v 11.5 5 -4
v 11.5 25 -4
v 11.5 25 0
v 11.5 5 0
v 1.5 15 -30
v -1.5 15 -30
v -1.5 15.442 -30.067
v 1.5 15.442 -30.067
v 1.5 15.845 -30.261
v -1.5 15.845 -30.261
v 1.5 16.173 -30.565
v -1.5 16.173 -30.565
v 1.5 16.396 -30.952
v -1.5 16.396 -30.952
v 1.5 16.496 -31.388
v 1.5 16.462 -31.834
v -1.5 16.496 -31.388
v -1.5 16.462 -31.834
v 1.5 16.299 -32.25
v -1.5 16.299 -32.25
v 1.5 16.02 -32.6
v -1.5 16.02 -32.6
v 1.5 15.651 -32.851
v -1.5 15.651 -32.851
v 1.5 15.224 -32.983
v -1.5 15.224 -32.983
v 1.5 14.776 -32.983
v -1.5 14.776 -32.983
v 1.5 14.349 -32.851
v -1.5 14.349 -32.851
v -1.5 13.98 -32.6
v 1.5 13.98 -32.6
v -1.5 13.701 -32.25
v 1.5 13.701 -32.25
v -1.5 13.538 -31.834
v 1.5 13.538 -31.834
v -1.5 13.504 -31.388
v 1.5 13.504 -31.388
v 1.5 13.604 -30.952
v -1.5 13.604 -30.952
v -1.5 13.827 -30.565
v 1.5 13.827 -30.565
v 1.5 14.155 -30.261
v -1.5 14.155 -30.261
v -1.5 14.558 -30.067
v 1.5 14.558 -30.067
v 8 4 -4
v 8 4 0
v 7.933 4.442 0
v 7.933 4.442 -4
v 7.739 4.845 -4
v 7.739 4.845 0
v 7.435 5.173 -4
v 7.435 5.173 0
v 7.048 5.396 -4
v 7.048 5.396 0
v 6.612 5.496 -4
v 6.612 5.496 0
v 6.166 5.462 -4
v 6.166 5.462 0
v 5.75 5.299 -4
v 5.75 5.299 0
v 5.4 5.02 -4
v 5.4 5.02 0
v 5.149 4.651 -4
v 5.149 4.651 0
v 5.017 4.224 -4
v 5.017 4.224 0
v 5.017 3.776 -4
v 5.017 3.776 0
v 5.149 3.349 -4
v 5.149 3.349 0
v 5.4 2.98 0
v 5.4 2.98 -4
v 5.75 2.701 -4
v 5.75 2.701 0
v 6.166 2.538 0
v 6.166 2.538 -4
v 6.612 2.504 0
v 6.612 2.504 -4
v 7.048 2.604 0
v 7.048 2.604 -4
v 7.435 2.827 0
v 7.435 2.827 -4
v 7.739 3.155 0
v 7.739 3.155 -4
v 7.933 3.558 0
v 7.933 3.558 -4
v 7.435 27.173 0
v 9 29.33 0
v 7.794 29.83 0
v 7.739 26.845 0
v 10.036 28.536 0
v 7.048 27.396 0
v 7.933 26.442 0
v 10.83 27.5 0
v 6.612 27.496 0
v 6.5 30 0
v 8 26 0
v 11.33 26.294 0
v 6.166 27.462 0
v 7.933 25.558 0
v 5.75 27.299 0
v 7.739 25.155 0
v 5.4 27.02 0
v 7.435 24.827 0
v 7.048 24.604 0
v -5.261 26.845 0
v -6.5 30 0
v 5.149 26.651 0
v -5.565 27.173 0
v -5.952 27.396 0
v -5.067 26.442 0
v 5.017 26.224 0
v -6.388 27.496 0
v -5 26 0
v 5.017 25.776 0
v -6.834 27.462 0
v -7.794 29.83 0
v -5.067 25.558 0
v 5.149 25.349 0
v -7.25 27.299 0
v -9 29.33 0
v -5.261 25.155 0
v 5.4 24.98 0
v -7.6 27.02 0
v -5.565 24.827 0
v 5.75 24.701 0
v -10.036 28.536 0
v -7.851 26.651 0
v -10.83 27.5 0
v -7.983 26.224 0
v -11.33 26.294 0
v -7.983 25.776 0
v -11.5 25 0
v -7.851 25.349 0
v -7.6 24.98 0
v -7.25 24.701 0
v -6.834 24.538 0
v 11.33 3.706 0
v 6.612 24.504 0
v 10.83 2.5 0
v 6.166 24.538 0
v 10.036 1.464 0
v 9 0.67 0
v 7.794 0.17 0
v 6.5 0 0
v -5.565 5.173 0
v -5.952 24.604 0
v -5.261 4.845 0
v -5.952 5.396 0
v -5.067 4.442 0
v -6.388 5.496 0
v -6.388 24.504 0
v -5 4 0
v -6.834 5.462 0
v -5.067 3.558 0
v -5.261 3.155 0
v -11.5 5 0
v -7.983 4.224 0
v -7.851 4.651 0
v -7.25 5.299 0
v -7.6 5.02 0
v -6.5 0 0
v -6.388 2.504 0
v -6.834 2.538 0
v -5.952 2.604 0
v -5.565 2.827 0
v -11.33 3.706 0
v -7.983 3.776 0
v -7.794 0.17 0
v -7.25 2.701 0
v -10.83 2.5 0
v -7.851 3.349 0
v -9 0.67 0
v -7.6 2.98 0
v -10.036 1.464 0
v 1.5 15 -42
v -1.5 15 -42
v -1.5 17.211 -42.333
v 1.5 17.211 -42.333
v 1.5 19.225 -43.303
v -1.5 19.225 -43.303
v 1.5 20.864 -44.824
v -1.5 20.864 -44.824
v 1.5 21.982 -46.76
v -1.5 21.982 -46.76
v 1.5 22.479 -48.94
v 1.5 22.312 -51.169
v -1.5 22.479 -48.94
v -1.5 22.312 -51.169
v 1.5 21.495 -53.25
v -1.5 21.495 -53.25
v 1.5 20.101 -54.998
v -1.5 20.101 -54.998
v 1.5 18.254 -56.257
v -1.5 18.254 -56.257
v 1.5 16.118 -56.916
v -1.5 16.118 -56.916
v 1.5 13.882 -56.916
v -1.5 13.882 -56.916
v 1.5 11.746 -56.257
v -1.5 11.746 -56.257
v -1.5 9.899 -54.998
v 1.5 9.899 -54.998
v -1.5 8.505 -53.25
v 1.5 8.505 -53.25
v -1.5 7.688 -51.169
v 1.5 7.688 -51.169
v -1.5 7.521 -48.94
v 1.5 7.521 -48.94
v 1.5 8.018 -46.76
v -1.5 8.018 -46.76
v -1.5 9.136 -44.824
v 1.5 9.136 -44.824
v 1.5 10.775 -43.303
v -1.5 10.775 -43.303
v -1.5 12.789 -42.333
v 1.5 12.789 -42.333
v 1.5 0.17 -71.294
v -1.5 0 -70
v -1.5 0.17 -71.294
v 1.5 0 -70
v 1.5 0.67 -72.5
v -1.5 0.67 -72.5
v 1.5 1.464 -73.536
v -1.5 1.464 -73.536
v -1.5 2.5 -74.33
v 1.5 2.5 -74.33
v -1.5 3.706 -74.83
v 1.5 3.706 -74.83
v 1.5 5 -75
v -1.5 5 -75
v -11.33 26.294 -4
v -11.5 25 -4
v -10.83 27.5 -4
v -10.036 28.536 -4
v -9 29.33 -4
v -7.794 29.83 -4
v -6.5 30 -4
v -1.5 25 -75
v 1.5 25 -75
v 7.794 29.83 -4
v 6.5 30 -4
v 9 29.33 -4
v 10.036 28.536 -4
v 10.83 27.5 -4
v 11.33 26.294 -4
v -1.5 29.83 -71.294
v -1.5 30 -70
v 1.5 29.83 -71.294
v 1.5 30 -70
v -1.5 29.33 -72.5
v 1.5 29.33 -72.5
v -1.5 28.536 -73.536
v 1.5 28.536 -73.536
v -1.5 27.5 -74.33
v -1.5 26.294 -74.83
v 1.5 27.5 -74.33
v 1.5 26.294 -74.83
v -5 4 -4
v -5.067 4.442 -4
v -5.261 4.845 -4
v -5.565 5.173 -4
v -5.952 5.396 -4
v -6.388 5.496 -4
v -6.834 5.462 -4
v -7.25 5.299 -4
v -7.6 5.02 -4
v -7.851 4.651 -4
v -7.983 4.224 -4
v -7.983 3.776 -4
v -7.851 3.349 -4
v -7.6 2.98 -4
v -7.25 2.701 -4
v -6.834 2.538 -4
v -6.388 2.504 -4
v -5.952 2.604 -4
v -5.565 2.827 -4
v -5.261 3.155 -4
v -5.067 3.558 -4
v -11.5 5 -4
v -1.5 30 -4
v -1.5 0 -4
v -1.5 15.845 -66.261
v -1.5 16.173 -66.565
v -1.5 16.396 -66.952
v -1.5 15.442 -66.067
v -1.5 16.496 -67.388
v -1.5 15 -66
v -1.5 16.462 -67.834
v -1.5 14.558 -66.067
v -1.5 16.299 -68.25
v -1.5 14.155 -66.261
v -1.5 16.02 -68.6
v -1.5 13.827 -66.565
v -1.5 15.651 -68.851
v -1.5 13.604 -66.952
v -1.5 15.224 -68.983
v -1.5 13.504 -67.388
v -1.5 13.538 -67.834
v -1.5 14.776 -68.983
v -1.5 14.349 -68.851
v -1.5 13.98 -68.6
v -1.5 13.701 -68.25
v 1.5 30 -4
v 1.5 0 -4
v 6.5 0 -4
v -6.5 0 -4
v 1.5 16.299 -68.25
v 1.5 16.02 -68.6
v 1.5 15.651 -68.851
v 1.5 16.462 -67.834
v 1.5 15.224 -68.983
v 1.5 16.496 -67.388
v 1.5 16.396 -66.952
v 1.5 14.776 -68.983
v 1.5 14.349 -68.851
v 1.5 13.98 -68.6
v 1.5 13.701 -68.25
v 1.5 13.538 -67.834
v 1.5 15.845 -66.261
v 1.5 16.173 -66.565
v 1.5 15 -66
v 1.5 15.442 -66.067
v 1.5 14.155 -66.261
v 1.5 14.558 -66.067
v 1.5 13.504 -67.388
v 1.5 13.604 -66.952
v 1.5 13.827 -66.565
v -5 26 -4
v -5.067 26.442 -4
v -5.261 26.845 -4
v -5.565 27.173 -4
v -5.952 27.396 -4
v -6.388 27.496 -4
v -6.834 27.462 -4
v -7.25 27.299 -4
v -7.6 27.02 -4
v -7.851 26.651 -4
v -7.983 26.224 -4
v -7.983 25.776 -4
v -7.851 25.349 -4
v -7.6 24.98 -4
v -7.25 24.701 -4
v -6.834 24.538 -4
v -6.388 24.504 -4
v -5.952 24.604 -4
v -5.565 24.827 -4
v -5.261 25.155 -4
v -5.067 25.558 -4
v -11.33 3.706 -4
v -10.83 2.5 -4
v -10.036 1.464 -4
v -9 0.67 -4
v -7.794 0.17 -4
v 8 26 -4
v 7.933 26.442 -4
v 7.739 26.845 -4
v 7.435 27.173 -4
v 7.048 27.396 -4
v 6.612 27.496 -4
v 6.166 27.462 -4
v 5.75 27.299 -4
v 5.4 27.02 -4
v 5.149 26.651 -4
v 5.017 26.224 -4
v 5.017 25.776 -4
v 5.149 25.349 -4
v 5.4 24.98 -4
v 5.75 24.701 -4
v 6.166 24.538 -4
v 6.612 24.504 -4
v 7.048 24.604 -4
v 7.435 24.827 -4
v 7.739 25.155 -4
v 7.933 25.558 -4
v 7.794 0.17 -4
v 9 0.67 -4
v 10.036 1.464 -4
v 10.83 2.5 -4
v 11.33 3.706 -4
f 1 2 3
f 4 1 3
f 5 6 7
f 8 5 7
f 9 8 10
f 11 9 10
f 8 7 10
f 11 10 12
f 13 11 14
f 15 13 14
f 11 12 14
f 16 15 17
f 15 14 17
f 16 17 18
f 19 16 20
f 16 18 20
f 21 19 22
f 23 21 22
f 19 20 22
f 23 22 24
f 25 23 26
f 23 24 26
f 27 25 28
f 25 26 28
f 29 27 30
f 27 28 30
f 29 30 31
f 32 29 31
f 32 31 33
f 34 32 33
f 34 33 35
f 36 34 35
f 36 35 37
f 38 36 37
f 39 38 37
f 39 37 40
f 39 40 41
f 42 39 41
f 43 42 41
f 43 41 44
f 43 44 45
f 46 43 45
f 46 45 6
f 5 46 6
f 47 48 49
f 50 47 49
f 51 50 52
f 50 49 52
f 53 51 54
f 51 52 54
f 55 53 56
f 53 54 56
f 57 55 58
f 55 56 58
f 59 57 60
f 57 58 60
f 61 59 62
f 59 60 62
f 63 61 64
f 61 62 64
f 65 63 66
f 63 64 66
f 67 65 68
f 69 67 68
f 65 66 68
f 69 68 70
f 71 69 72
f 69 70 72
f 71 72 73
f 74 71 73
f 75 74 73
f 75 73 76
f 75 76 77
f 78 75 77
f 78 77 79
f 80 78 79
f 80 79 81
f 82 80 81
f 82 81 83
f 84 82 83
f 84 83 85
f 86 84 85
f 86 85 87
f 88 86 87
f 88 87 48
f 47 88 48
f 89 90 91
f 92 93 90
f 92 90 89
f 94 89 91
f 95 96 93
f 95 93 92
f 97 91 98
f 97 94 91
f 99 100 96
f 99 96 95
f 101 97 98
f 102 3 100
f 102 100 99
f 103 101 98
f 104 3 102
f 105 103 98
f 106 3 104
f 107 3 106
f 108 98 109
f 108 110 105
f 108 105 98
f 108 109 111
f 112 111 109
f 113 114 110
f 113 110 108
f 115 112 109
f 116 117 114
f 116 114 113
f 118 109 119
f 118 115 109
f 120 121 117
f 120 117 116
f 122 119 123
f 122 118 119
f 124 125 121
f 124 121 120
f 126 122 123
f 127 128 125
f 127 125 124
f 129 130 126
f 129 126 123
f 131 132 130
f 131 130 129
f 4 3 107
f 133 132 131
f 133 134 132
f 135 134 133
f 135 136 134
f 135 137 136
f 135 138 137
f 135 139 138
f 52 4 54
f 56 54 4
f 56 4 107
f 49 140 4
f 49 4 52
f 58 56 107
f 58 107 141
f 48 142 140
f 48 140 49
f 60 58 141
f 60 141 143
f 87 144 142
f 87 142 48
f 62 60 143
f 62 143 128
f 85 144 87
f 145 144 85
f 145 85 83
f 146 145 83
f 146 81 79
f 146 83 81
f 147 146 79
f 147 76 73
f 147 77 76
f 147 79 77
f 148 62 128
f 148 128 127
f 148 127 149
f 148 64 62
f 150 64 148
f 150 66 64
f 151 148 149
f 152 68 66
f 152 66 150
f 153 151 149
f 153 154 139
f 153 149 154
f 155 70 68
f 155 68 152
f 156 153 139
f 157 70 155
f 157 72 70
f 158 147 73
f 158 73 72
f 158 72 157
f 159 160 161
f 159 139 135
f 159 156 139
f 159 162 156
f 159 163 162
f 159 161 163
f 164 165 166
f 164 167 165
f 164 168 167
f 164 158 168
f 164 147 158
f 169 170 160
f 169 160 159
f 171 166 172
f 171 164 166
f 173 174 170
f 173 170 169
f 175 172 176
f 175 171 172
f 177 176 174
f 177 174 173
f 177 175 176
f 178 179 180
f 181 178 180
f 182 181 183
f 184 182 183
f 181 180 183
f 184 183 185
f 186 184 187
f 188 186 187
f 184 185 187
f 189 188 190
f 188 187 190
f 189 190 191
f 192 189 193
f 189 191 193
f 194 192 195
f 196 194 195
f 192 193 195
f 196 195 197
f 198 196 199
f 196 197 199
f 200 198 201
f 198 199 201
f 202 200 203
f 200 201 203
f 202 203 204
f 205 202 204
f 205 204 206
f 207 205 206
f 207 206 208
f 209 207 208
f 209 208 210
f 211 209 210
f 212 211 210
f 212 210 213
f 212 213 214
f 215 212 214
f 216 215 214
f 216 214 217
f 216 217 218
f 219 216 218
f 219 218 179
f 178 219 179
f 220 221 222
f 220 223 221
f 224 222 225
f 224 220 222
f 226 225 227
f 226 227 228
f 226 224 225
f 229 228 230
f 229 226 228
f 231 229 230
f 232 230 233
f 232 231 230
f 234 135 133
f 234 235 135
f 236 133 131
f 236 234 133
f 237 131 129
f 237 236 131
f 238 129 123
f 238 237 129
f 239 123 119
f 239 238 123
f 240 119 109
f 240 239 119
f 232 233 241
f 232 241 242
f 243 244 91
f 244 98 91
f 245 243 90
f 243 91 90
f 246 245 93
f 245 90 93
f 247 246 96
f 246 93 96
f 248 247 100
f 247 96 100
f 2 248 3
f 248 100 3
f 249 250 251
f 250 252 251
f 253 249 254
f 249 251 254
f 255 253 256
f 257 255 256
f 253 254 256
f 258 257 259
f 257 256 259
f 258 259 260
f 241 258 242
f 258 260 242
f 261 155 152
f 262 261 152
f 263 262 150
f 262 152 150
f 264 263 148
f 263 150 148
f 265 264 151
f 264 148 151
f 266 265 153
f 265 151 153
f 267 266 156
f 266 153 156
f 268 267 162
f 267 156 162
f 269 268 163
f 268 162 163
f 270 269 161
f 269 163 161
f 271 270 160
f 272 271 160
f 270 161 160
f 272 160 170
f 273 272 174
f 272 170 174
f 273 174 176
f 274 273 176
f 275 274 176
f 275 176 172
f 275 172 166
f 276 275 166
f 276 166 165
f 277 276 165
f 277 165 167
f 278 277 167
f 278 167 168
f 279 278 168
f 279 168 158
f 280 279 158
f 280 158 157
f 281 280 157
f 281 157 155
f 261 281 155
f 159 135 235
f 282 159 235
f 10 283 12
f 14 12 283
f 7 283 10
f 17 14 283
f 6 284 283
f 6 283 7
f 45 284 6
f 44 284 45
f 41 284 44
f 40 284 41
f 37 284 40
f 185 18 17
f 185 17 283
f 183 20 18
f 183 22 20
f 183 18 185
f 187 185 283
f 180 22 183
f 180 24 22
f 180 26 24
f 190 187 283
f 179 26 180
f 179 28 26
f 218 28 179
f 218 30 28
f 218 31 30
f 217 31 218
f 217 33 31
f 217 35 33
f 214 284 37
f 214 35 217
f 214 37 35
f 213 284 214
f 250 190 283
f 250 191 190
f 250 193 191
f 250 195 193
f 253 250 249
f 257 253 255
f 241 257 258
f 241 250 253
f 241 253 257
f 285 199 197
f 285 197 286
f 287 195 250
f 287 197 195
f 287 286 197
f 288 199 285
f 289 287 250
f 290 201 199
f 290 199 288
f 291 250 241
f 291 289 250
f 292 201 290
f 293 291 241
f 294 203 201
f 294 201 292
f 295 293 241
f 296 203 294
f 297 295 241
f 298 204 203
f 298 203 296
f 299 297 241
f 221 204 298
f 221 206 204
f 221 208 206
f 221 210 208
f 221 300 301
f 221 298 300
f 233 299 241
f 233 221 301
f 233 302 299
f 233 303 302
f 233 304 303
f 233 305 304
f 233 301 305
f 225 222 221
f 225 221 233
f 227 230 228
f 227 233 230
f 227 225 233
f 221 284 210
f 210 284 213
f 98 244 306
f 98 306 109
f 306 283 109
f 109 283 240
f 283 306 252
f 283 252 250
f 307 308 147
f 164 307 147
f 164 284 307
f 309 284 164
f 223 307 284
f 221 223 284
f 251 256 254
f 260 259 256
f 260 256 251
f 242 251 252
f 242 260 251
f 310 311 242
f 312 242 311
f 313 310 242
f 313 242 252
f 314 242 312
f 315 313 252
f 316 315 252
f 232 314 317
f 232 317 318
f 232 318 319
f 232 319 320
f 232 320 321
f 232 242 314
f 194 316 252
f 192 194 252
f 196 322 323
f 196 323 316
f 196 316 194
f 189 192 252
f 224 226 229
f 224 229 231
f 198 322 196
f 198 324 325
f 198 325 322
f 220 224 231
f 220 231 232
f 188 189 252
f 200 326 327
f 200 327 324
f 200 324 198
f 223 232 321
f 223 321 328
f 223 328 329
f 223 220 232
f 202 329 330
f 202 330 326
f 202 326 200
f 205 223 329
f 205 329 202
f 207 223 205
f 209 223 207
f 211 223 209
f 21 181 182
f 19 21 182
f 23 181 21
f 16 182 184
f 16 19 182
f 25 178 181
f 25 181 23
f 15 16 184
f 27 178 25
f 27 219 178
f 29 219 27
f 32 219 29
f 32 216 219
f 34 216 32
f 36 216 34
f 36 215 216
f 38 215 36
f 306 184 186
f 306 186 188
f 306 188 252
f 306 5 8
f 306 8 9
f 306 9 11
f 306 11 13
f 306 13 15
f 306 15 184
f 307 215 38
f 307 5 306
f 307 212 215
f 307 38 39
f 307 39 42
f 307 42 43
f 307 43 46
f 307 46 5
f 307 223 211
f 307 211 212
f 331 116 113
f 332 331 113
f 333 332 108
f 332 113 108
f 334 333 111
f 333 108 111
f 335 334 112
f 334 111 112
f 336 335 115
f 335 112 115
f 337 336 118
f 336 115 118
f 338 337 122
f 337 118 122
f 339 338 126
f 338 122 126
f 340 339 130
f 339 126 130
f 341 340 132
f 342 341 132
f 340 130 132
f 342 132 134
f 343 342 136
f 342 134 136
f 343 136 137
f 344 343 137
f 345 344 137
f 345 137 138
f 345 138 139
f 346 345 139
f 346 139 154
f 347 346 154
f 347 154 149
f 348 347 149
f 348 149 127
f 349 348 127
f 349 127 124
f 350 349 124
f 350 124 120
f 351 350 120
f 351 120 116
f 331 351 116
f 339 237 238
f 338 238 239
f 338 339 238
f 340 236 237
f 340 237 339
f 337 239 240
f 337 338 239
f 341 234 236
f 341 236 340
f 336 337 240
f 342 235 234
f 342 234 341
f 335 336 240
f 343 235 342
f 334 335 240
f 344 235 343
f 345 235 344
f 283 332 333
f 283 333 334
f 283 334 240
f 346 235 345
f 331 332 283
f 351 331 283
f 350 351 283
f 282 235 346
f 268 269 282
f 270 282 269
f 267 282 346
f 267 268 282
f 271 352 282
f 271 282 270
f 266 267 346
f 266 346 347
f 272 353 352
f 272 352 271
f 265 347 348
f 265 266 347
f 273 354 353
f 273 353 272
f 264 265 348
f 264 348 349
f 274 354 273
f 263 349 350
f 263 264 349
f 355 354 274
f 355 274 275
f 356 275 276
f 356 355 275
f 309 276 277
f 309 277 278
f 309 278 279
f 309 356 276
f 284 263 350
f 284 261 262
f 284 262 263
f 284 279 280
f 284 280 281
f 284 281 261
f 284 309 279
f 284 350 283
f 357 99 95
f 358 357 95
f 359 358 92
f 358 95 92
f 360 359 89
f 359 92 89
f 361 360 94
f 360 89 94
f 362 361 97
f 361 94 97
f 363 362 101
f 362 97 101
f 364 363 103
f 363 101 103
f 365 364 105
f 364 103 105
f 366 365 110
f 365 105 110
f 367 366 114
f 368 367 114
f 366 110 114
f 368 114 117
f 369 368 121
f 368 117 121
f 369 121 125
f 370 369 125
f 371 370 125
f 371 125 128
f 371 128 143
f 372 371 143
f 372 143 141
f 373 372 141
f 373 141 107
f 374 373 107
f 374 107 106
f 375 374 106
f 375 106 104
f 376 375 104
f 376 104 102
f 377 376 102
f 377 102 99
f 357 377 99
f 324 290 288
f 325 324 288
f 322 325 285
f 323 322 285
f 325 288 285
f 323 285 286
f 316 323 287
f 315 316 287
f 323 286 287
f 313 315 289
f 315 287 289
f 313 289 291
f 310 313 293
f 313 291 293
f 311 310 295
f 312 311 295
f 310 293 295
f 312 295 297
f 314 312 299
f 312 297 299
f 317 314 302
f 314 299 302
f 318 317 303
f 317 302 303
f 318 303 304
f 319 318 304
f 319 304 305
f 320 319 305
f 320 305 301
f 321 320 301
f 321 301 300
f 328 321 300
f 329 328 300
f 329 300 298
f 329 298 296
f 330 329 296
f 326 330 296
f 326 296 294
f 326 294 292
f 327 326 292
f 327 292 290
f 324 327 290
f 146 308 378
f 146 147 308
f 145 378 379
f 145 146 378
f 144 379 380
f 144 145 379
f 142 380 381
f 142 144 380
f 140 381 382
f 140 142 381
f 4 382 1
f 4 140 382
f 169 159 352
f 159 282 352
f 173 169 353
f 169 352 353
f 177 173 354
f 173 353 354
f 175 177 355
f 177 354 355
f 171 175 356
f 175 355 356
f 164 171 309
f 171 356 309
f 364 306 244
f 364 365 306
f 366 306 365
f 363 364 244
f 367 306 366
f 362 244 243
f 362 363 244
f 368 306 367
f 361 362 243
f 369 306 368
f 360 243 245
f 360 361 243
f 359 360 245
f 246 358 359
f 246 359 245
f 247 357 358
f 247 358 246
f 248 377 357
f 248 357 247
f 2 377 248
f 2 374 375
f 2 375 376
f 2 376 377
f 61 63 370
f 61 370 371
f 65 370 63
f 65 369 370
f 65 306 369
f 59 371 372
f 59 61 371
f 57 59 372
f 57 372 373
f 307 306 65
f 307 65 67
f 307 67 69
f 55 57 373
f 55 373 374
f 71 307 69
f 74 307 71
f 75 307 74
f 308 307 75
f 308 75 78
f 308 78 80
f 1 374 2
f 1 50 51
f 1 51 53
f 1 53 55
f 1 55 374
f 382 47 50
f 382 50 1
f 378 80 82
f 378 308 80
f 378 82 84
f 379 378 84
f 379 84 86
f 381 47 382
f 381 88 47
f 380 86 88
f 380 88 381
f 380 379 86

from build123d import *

# Parameters (mm, degrees)
BOSS_EXTRUDE1_DEPTH = 30
SKETCH2_R           = 1.5
SKETCH2_R_2         = 7.5
CUT_EXTRUDE1_DEPTH  = 14
SKETCH3_R           = 1.5
CUT_EXTRUDE2_DEPTH  = 76
FILLET1_R           = 5


with BuildPart() as part:
    # Sketch1 → Boss-Extrude1 (new body)
    with BuildSketch(Plane(origin=(0, 0, 0), x_dir=(1, 0, 0), z_dir=(0, 1, 0))):
        Polygon((-11.5, 4), (-1.5, 4), (-1.5, 75), (1.5, 75), (1.5, 4), (11.5, 4), (11.5, 0), (-11.5, 0), align=None)
    extrude(amount=BOSS_EXTRUDE1_DEPTH)

    # Sketch2 → Cut-Extrude1 (cut, through all)
    with BuildSketch(Plane.ZY.offset(1.5)):
        with Locations((-67.5, 15)):
            Circle(SKETCH2_R)
        with Locations((-31.5, 15)):
            Circle(SKETCH2_R)
        with Locations((-49.5, 15)):
            Circle(SKETCH2_R_2)
    extrude(amount=-CUT_EXTRUDE1_DEPTH, mode=Mode.SUBTRACT)

    # Sketch3 → Cut-Extrude2 (cut, through all)
    with BuildSketch(Plane.XY):
        with Locations((-6.5, 26)):
            Circle(SKETCH3_R)
        with Locations((-6.5, 4)):
            Circle(SKETCH3_R)
        with Locations((6.5, 4)):
            Circle(SKETCH3_R)
        with Locations((6.5, 26)):
            Circle(SKETCH3_R)
    extrude(amount=-CUT_EXTRUDE2_DEPTH, mode=Mode.SUBTRACT)

    # Fillet1
    fillet1_edges = [part.edges().sort_by_distance(p)[0] for p in [
        (11.5, 0, -2),
        (-11.5, 0, -2),
        (11.5, 30, -2),
        (0, 30, -75),
        (-11.5, 30, -2),
        (0, 0, -75),
    ]]
    fillet(fillet1_edges, radius=FILLET1_R)


solid = part.part
